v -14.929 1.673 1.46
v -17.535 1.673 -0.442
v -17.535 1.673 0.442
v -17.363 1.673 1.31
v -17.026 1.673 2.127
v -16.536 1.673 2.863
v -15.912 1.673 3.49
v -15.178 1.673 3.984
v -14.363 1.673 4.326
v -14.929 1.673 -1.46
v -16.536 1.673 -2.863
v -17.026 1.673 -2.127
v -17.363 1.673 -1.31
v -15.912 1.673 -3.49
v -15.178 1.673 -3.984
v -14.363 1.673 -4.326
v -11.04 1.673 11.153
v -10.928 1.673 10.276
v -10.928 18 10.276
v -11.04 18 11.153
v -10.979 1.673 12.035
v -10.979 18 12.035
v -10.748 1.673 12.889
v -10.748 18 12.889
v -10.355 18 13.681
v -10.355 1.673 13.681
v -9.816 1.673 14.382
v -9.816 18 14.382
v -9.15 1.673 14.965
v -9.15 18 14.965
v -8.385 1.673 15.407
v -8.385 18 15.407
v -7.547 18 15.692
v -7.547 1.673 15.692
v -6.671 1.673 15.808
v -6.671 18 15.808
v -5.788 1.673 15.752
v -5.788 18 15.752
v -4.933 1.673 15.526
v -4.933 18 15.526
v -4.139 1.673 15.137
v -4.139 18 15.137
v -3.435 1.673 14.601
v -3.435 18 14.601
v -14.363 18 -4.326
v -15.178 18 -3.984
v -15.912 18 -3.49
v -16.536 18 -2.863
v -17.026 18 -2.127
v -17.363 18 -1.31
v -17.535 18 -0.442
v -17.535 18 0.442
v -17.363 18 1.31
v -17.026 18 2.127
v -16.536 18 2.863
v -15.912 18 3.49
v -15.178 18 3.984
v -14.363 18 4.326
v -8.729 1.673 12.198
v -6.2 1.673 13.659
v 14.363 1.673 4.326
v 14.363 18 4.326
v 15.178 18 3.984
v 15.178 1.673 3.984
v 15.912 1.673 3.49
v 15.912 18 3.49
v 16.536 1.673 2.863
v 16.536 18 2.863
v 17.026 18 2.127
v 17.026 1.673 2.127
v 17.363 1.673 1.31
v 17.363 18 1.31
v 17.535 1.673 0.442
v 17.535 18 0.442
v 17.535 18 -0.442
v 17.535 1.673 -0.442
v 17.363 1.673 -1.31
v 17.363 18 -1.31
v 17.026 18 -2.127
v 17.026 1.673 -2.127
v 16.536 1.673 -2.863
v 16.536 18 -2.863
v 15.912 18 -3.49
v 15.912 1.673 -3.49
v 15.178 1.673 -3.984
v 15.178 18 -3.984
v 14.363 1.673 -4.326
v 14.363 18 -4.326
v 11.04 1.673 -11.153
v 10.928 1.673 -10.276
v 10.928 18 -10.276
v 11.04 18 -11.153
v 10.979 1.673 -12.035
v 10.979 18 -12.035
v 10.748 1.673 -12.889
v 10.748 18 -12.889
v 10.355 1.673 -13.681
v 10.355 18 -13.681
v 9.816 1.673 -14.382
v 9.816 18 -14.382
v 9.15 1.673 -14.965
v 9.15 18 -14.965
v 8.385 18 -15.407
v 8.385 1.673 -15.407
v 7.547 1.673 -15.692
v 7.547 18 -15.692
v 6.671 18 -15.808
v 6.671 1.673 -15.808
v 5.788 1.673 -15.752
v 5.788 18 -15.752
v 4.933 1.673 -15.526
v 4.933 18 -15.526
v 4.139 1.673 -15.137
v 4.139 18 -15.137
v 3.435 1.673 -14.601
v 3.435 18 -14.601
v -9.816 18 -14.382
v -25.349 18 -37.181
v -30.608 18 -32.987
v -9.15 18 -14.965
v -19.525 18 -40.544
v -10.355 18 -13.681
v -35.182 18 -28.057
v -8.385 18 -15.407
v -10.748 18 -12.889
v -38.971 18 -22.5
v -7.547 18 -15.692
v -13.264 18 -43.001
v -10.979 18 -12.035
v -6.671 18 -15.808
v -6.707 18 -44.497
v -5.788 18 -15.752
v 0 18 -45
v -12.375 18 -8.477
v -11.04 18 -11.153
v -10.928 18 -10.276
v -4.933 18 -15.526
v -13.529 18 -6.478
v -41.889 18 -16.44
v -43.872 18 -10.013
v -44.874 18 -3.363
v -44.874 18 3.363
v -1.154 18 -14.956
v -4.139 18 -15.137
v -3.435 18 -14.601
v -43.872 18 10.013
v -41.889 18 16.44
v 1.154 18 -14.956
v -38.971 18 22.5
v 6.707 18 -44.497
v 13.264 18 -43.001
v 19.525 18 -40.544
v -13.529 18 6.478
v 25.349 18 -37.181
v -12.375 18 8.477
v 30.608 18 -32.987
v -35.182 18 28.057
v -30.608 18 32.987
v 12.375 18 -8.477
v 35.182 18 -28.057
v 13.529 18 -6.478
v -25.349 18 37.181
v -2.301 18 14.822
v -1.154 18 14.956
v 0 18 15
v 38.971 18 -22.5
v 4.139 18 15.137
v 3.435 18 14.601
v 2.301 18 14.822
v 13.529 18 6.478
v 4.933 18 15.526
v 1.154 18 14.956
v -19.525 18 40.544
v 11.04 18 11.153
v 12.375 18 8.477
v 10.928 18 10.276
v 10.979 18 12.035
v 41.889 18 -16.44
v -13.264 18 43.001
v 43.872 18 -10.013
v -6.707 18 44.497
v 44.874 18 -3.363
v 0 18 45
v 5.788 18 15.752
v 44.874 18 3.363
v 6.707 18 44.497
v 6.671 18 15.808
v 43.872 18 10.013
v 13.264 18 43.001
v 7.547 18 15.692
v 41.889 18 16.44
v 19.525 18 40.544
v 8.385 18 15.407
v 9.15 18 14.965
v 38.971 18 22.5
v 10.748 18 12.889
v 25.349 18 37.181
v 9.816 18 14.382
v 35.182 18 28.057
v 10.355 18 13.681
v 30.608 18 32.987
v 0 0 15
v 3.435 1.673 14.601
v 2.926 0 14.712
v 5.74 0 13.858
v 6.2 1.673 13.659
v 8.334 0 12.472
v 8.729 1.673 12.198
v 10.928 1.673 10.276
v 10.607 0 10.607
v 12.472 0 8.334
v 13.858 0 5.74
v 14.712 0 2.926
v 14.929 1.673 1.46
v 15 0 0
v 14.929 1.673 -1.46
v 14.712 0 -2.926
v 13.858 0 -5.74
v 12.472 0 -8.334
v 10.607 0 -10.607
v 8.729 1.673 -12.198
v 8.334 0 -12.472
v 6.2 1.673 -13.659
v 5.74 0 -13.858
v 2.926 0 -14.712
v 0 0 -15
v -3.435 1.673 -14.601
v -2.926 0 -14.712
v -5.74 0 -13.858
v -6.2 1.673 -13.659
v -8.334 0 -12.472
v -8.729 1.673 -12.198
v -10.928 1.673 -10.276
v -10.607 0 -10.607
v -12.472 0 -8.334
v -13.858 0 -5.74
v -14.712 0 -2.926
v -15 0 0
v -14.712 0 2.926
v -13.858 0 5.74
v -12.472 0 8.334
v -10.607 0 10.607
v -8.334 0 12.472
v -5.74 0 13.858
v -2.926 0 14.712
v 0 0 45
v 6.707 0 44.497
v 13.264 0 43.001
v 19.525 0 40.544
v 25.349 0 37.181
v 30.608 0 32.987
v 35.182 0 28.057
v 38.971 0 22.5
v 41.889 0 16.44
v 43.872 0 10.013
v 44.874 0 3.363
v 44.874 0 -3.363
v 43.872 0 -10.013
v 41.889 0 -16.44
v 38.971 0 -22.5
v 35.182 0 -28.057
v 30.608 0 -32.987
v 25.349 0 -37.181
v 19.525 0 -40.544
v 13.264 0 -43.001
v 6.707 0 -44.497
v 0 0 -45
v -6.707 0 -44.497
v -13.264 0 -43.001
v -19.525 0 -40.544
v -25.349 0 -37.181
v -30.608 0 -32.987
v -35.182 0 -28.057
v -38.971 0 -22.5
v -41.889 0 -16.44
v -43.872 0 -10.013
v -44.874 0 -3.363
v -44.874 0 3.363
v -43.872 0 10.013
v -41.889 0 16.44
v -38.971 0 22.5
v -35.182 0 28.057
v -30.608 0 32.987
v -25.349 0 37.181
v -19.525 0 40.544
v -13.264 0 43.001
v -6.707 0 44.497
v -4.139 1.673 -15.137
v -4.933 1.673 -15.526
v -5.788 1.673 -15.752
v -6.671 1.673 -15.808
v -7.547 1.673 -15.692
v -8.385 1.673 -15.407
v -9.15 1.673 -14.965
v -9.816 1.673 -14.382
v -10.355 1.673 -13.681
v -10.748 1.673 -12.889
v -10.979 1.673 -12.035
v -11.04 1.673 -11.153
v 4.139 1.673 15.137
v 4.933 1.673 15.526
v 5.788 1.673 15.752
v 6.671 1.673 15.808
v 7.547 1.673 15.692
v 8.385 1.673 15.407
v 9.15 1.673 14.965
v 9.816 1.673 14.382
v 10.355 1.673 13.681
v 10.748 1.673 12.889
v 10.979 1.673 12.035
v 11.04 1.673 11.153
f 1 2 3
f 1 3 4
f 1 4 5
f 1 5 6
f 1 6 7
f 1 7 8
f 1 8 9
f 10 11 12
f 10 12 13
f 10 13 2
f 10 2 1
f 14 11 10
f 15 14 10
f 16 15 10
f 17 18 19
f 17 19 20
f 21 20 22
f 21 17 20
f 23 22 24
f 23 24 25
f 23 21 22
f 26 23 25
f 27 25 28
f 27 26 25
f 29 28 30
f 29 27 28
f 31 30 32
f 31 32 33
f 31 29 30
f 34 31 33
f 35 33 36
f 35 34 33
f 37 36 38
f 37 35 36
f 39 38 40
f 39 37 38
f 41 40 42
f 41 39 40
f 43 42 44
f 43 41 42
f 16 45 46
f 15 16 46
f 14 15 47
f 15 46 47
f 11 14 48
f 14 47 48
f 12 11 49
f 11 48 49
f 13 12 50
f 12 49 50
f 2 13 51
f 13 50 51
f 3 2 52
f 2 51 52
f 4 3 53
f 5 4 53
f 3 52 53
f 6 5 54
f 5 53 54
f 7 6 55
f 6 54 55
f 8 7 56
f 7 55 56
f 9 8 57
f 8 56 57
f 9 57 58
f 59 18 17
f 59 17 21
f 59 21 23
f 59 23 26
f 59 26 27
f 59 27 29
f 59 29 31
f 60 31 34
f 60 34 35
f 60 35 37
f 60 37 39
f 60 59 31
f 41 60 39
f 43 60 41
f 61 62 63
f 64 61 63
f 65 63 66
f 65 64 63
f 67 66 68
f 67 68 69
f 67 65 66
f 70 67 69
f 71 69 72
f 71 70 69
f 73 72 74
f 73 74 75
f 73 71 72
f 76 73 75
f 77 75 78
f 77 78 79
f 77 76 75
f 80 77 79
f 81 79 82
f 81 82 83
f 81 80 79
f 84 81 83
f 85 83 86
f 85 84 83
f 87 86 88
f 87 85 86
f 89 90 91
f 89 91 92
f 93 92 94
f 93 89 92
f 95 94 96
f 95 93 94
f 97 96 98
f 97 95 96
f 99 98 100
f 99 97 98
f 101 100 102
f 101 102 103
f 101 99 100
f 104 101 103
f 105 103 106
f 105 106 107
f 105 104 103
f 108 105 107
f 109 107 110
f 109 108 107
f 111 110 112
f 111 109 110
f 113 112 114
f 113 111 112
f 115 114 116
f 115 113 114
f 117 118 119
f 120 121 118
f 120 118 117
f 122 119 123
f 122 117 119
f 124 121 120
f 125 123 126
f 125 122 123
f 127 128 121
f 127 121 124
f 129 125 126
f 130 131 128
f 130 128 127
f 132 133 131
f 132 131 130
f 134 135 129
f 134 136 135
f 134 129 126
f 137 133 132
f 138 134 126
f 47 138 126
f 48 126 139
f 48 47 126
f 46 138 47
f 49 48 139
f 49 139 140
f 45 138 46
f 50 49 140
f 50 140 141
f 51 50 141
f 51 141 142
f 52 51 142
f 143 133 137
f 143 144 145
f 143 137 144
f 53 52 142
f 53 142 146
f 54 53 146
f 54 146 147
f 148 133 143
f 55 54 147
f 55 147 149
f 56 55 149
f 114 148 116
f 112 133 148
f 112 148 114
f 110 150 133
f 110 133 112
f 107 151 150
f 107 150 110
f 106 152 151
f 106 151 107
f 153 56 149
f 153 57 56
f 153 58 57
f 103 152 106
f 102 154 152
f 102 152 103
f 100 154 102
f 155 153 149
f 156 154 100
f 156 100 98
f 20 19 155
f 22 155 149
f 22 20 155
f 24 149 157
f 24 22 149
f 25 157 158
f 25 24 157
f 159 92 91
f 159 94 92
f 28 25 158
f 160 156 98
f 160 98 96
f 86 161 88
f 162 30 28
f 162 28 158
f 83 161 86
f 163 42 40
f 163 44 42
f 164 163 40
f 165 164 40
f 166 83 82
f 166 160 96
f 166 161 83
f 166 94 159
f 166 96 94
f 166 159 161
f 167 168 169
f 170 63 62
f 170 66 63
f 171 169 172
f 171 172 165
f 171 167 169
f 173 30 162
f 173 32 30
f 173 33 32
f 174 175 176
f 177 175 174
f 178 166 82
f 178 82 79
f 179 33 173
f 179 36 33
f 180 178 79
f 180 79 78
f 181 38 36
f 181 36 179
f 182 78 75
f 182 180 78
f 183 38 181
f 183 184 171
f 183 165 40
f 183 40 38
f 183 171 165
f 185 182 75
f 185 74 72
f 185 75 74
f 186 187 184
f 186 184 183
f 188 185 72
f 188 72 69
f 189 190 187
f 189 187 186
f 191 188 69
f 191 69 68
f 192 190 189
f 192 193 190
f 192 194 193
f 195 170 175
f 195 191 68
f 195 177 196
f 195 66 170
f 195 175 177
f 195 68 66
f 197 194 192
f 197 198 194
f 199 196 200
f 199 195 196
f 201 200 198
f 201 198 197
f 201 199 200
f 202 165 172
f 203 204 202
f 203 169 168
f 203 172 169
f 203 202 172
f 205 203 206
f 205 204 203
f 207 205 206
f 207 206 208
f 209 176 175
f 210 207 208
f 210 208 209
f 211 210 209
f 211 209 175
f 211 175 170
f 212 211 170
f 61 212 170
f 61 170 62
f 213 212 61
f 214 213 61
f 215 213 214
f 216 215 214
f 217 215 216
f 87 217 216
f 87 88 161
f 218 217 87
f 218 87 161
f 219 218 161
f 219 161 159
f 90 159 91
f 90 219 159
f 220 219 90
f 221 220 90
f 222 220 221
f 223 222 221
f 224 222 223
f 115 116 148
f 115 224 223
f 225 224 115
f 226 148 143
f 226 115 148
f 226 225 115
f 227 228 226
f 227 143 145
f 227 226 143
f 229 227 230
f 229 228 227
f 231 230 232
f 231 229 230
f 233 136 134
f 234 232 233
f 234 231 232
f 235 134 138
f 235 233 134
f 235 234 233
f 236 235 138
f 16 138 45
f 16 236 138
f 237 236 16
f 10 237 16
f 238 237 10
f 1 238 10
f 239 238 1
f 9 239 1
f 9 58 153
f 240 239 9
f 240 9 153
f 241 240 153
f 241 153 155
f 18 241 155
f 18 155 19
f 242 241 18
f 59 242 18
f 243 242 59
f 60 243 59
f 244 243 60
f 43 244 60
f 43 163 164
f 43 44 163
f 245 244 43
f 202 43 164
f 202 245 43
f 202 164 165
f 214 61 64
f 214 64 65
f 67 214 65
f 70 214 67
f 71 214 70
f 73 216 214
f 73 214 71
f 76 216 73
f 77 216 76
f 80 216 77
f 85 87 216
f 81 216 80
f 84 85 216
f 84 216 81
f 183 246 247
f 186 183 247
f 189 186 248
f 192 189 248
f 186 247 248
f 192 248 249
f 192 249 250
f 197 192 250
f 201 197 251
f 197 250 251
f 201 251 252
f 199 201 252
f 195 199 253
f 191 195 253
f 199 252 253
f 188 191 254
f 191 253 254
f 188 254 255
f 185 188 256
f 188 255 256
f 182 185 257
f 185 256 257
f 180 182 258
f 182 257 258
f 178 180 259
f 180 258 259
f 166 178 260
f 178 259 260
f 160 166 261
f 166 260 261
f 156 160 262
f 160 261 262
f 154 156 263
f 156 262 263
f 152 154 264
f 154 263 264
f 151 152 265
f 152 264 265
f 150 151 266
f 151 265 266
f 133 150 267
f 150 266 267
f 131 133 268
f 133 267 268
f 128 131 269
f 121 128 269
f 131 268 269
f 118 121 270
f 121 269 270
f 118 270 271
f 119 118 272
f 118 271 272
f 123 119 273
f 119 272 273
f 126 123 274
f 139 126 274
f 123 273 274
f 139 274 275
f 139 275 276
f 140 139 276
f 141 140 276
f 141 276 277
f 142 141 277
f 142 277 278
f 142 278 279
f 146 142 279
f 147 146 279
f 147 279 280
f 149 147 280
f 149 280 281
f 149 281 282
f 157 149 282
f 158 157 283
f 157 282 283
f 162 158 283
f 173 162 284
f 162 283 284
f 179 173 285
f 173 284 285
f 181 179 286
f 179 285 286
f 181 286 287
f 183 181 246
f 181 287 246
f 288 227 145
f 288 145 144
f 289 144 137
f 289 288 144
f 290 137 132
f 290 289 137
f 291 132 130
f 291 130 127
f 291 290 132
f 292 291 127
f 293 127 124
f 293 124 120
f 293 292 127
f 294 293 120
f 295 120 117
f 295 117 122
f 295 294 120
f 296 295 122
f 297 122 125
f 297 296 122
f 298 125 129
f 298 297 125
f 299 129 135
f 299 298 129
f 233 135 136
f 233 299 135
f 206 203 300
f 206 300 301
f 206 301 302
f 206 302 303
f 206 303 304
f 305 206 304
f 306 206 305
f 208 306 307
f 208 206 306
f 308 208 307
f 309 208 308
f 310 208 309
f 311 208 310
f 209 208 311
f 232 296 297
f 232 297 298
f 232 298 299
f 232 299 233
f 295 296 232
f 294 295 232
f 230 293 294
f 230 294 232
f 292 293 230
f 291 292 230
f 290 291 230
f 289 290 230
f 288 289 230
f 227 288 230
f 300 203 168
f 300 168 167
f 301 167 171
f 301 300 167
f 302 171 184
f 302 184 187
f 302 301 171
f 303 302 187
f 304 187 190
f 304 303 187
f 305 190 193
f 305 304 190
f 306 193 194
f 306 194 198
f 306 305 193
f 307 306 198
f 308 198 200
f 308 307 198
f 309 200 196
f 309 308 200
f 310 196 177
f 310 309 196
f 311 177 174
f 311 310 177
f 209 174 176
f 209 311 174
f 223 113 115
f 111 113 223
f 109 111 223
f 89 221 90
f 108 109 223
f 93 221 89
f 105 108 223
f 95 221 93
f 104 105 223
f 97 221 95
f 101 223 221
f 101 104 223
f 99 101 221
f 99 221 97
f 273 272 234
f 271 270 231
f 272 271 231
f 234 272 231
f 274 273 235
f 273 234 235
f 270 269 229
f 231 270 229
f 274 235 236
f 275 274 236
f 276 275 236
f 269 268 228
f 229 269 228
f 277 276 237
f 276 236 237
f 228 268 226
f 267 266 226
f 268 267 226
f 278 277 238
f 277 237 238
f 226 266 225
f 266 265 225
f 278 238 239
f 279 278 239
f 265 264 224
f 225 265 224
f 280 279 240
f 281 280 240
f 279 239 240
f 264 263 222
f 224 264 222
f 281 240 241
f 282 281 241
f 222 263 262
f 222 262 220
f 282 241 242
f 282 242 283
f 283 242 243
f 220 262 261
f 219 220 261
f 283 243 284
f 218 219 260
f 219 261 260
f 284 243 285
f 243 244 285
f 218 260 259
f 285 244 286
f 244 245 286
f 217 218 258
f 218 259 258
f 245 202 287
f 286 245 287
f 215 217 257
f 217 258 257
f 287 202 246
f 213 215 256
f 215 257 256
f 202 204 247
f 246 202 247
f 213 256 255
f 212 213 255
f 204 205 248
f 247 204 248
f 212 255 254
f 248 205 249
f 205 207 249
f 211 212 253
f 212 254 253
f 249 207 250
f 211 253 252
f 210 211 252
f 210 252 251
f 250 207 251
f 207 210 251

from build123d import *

# Parameters (mm, degrees)
SKETCH1_R           = 45
BOSS_EXTRUDE1_DEPTH = 18
SKETCH2_R           = 15
CUT_EXTRUDE1_DEPTH  = 67.136223055
SKETCH3_R           = 4.526260275
CUT_EXTRUDE2_DEPTH  = 16.327001944
CIRPATTERN1_COUNT   = 6


with BuildPart() as part:
    # Sketch1 → Boss-Extrude1 (new body)
    with BuildSketch(Plane(origin=(0, 0, 0), x_dir=(1, 0, 0), z_dir=(0, 1, 0))):
        Circle(SKETCH1_R)
    extrude(amount=BOSS_EXTRUDE1_DEPTH)

    # Sketch2 → Cut-Extrude1 (cut, through all)
    with BuildSketch(Plane(origin=(0, 0, 0), x_dir=(1, 0, 0), z_dir=(0, 1, 0))):
        Circle(SKETCH2_R)
    extrude(amount=CUT_EXTRUDE1_DEPTH, mode=Mode.SUBTRACT)

    # Sketch3 → Cut-Extrude2 (cut)
    with BuildSketch(Plane(origin=(0, 18, 0), x_dir=(1, 0, 0), z_dir=(0, 1, 0))):
        with Locations((-13.030483377, 0)):
            Circle(SKETCH3_R)
    cut_extrude2 = extrude(amount=-CUT_EXTRUDE2_DEPTH, mode=Mode.SUBTRACT)

    # CirPattern1: Cut-Extrude2 ×6 about axis
    cirpattern1_axis = Axis((0, 0, 0), (0, 1, 0))
    for i in range(1, CIRPATTERN1_COUNT):
        add(cut_extrude2.rotate(cirpattern1_axis, i * 360 / CIRPATTERN1_COUNT), mode=Mode.SUBTRACT)


solid = part.part
